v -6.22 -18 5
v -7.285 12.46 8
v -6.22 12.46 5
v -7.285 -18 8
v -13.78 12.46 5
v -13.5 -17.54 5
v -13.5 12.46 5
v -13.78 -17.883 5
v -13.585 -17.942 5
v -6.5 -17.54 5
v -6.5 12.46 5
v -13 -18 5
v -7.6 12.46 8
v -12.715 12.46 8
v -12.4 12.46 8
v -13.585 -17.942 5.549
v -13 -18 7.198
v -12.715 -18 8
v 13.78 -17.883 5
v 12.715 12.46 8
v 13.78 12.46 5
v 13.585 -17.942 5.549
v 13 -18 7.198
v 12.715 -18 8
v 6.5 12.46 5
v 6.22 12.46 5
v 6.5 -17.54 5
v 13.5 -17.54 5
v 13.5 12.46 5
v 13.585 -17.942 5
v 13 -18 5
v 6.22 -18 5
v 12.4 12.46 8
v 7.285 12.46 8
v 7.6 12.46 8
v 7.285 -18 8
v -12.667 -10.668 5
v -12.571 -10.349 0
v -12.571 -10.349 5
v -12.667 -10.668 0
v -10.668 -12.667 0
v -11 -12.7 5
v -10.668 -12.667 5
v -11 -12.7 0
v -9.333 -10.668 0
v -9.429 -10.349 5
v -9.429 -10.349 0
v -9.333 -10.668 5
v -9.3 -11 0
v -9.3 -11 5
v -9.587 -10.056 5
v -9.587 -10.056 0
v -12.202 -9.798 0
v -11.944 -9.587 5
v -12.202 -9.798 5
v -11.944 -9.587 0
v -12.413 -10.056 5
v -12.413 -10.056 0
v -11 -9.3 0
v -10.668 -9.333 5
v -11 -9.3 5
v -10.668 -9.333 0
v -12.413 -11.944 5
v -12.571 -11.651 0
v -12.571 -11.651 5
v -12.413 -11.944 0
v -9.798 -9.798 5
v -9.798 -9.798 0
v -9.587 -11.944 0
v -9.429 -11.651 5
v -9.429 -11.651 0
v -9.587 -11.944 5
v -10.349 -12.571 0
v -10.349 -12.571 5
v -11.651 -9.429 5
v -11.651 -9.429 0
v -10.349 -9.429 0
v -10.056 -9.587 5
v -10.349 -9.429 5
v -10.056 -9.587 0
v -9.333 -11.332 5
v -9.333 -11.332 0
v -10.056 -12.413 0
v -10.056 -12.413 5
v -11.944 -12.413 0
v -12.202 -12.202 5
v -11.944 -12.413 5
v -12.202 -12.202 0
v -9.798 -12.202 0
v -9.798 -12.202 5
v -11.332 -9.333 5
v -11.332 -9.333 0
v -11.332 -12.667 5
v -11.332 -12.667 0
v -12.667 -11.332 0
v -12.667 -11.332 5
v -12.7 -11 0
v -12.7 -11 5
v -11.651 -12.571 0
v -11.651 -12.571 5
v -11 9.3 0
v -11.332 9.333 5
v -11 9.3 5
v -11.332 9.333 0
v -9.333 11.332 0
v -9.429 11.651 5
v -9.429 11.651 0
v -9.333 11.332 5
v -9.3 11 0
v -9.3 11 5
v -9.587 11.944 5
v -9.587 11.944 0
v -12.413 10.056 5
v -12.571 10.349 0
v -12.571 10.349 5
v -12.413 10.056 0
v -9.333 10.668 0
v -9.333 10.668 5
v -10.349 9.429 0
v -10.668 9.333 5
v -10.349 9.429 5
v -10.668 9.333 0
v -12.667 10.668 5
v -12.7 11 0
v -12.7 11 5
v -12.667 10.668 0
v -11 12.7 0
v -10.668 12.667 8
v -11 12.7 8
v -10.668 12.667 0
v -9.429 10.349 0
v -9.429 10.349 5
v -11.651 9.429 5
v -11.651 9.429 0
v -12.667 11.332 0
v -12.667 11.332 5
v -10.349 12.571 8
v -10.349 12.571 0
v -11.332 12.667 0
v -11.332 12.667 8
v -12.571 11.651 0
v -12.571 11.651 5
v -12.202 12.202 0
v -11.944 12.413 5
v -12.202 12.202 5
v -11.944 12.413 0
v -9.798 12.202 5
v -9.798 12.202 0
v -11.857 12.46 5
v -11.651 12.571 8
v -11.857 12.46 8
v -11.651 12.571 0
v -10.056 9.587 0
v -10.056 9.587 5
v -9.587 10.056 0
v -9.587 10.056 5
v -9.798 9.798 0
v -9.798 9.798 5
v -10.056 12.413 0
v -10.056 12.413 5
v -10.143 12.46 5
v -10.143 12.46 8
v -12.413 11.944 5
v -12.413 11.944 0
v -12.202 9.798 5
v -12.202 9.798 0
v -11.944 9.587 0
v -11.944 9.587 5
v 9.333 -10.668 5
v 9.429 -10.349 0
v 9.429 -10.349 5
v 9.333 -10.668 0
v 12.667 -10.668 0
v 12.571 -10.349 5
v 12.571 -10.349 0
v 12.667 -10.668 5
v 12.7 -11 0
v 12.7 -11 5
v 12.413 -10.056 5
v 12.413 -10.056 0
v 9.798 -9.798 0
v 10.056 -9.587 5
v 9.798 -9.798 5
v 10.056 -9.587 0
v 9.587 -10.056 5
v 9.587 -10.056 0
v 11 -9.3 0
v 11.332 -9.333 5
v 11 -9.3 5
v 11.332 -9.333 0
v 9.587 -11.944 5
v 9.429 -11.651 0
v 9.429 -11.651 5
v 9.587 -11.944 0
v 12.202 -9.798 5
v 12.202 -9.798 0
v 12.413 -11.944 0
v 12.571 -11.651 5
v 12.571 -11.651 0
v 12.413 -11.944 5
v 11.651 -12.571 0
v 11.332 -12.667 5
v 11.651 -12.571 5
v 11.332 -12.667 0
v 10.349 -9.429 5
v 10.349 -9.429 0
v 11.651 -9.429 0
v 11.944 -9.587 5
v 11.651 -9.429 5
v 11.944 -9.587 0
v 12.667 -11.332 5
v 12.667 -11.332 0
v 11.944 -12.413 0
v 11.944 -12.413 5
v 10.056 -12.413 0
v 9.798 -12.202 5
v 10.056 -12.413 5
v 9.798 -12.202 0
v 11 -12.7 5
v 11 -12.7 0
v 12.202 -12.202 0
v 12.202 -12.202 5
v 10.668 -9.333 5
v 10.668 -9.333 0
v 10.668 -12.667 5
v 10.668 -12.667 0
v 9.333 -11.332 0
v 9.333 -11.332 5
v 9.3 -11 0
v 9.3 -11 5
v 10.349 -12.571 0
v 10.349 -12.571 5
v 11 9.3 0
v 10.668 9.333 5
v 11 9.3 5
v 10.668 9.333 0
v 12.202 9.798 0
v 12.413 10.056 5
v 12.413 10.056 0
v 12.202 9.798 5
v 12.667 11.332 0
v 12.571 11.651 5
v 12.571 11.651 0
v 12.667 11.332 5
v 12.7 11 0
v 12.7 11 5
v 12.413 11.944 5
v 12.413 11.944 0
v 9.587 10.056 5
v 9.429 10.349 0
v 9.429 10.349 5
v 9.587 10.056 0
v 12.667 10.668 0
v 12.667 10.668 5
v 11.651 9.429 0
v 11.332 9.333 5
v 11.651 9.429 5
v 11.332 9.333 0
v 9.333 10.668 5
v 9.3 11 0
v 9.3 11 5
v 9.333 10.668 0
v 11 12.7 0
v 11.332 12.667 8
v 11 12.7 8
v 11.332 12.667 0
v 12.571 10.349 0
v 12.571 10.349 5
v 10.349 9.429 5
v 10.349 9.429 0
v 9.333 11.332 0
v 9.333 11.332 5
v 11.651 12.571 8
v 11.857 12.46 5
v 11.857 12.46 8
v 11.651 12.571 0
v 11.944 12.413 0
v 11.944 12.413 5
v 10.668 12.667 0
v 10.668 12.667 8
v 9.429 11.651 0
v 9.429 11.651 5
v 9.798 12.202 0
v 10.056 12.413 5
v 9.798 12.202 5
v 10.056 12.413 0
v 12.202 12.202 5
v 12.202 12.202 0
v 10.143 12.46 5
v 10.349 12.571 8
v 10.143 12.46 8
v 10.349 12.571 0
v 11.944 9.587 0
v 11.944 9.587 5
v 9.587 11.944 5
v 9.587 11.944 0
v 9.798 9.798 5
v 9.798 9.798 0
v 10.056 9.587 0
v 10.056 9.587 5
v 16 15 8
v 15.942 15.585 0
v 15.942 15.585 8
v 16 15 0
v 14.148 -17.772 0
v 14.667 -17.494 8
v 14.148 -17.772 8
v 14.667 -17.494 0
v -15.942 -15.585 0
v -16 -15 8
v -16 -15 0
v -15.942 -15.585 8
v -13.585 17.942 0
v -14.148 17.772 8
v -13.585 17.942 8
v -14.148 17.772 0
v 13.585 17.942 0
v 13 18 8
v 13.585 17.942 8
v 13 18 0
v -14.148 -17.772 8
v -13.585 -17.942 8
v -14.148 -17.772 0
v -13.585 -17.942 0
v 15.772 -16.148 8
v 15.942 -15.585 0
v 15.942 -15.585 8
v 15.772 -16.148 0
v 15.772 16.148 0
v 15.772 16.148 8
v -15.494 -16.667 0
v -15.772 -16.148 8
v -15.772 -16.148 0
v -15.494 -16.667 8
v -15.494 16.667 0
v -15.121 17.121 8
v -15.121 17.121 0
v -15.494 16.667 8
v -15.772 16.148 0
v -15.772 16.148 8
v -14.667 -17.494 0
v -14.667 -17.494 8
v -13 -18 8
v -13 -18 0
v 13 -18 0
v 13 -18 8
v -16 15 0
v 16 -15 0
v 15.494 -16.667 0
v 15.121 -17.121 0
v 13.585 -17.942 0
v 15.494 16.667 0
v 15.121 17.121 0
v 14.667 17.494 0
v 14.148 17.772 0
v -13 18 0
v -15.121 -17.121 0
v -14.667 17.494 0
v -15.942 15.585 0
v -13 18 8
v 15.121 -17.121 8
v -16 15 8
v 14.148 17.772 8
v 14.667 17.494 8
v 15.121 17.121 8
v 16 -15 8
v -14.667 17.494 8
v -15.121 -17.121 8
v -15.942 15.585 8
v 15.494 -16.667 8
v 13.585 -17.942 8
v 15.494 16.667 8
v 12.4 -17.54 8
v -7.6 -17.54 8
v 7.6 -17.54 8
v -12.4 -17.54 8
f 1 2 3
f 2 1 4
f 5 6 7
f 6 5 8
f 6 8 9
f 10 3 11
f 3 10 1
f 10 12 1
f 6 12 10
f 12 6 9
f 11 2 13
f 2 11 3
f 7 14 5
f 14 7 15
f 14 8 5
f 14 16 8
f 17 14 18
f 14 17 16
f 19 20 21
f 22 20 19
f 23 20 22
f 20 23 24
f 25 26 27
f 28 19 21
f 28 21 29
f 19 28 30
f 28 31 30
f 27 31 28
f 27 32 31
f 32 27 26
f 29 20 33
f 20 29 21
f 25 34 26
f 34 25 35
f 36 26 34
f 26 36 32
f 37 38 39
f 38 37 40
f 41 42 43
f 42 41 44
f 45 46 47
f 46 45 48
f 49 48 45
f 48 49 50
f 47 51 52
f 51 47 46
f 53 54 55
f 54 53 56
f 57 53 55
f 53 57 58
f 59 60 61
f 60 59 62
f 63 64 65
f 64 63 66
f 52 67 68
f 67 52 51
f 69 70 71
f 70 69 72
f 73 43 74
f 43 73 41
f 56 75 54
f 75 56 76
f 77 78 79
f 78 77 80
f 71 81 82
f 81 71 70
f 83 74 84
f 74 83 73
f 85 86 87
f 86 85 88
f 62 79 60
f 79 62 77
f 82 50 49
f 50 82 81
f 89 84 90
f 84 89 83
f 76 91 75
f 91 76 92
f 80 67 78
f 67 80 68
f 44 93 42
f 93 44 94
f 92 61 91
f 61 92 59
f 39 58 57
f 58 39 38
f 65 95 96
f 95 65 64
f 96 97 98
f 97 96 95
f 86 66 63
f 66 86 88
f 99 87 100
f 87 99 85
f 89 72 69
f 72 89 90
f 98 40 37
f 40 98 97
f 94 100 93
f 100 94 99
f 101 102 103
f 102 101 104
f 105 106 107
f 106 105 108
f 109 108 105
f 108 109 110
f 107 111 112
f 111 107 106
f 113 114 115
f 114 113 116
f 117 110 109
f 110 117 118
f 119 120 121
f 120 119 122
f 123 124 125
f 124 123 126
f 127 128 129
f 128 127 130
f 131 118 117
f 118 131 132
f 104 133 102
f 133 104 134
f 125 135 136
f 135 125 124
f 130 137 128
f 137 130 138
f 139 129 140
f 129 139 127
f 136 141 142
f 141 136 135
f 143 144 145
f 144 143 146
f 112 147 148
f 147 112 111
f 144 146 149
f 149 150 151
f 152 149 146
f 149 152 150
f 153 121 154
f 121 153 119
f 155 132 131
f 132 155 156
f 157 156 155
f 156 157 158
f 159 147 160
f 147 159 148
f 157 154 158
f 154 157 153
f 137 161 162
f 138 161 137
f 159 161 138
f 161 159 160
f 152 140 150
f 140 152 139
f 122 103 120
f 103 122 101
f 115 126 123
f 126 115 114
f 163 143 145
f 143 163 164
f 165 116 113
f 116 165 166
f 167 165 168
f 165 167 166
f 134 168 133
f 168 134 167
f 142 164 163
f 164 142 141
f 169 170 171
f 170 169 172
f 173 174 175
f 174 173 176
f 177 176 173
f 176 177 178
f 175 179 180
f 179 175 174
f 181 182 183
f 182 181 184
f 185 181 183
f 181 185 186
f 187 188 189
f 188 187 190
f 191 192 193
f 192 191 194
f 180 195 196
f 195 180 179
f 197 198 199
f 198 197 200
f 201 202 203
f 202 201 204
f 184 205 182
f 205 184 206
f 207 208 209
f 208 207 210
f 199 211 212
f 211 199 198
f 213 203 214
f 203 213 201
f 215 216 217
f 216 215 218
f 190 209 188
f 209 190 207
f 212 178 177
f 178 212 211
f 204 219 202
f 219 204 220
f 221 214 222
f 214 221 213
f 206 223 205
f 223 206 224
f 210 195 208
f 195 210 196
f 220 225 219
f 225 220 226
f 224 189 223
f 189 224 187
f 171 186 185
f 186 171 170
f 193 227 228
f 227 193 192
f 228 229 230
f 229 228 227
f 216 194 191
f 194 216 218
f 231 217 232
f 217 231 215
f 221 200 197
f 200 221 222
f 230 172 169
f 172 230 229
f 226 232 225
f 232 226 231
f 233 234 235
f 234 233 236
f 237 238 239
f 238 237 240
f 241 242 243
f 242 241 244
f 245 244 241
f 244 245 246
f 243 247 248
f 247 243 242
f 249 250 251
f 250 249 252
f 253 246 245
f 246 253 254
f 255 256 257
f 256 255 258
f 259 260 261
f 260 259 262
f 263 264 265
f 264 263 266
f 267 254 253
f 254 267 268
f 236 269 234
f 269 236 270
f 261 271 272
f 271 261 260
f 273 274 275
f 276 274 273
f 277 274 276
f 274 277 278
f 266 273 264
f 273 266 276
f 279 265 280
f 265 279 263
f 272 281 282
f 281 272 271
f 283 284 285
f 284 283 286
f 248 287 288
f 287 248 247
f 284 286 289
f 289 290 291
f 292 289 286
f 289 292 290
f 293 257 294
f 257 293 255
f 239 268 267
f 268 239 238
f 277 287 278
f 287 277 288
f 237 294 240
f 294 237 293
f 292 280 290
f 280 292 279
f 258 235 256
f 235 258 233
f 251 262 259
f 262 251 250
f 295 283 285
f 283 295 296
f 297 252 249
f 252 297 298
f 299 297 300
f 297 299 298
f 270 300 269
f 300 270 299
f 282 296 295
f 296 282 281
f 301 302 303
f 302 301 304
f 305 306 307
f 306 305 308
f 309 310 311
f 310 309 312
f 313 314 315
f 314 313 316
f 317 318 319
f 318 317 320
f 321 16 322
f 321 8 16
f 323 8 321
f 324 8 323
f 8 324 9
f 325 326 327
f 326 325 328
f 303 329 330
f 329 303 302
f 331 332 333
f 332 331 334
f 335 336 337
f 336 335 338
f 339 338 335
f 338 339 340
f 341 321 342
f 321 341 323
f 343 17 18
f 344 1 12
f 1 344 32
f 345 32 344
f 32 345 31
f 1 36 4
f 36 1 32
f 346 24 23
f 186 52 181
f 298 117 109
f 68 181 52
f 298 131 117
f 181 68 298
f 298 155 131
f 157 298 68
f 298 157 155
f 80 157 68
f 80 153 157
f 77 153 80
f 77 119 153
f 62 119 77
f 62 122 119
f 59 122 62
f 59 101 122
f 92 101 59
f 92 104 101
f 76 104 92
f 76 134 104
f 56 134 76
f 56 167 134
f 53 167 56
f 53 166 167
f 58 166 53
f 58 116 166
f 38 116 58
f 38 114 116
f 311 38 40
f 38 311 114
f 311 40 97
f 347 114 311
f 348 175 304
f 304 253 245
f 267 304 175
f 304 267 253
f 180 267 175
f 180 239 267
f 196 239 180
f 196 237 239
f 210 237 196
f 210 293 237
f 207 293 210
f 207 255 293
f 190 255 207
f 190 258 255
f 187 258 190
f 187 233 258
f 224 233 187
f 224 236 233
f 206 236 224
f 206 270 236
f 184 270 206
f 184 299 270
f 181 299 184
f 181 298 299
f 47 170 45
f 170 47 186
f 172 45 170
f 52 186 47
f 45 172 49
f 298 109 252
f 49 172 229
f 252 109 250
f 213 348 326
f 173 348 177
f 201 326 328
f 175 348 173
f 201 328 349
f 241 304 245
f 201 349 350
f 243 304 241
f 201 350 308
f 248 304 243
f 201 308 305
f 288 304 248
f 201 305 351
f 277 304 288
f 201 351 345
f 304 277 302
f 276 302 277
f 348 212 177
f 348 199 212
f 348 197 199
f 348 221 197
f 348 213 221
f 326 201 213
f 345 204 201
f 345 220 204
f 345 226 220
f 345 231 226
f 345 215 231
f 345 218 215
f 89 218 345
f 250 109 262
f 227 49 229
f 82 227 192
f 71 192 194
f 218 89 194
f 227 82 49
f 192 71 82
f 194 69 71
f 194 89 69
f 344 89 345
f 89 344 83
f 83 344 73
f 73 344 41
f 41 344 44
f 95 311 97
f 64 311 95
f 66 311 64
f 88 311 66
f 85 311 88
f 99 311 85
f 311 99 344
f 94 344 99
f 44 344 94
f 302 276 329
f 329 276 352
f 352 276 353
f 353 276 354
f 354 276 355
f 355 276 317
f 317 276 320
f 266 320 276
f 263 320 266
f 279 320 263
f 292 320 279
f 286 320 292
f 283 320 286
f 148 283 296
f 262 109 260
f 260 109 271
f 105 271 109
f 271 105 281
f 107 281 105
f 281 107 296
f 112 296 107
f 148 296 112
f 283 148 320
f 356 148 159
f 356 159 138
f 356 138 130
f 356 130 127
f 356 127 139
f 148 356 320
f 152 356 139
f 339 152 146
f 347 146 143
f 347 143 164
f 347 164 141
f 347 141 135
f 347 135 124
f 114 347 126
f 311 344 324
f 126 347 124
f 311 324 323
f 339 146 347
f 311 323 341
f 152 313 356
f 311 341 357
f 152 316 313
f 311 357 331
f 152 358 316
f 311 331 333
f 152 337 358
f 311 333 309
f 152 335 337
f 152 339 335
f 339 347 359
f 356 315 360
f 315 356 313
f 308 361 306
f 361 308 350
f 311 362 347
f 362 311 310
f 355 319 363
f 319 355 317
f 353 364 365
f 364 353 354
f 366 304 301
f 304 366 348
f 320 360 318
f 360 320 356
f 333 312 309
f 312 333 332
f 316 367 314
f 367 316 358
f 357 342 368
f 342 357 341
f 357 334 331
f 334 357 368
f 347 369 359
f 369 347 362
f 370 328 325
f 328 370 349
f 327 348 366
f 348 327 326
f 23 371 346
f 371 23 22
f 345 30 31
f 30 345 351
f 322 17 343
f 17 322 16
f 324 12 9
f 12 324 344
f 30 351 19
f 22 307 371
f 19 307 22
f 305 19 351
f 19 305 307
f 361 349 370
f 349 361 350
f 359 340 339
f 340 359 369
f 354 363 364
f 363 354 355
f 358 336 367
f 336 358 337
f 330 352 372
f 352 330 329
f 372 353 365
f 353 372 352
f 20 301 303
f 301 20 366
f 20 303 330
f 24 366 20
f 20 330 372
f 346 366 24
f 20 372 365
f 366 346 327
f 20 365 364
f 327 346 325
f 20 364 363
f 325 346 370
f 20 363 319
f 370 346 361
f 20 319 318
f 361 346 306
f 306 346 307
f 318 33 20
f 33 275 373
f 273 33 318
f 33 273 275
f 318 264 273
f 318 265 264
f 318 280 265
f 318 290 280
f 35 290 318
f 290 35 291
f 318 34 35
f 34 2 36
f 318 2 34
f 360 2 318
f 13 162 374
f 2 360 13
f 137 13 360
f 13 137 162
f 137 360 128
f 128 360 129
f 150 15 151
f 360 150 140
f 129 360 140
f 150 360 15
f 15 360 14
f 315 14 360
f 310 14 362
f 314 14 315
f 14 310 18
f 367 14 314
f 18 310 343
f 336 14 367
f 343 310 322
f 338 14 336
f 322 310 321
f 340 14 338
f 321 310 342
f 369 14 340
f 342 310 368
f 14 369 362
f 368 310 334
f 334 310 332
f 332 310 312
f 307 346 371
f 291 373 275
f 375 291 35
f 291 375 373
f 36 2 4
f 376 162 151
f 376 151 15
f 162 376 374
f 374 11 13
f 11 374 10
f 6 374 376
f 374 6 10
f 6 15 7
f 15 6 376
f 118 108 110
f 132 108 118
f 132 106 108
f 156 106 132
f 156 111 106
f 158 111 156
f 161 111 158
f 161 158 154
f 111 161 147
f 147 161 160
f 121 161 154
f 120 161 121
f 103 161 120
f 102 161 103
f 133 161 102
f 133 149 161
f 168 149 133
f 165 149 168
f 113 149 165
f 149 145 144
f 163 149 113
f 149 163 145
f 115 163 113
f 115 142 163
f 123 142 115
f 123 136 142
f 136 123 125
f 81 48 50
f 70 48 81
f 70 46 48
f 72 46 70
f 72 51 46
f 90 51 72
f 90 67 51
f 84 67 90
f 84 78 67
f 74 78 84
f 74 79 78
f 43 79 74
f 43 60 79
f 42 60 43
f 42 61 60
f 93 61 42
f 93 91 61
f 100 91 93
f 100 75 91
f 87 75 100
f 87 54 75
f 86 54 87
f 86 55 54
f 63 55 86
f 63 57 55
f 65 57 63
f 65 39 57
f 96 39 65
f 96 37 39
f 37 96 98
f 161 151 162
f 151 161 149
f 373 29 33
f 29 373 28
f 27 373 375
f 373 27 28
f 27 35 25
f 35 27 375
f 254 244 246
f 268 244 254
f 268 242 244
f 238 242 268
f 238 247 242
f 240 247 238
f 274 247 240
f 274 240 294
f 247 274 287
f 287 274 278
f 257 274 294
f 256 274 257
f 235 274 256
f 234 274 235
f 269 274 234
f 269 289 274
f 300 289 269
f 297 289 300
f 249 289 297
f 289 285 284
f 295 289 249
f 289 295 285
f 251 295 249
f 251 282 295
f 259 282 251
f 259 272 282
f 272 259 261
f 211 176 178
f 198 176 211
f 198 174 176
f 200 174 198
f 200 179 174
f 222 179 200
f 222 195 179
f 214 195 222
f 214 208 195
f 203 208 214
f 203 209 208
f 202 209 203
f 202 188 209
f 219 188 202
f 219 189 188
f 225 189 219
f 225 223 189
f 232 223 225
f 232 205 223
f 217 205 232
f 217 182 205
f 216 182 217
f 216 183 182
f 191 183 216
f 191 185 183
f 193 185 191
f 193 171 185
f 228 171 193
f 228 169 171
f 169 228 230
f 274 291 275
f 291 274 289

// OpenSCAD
// file: ../source/rm_common.scad
// RobotMind Rev A: one slide-in interface for every payload carrier.
// Dimensions are mm; tune clearance on a short fit coupon before full prints.
$fn = 32;

RM_EPS = 0.1;
RM_CLEARANCE = 0.28;
RM_M3_CLEARANCE = 3.4;

RM_DOCK_W = 32;
RM_DOCK_L = 36;
RM_DOCK_H = 8;
RM_RAIL_X = 10;
RM_RAIL_ROOT = 4.8;
RM_RAIL_HEAD = 7.0;
RM_RAIL_H = 3.0;
RM_RAIL_L = 30;

assert(RM_RAIL_HEAD > RM_RAIL_ROOT, "Rail must retain the carrier");
assert(RM_DOCK_H > RM_RAIL_H, "Dock needs material below the rail");
assert(RM_RAIL_L + 2*RM_CLEARANCE < RM_DOCK_L,
       "Rail needs an open insertion end and rear stop");

module rounded_box(size=[20,20,3], r=2) {
  linear_extrude(height=size[2])
    offset(r=r) offset(delta=-r) square([size[0],size[1]]);
}

// The profile is narrow at the carrier root and wider at its free end.
module rail_profile(root=RM_RAIL_ROOT, head=RM_RAIL_HEAD, h=RM_RAIL_H) {
  polygon(points=[[-root/2,0], [root/2,0], [head/2,h], [-head/2,h]]);
}

// Runs along +Y and projects below Z=0. Carriers place this at their underside.
module male_rail(length=RM_RAIL_L) {
  translate([0,-length/2,0]) rotate([-90,0,0])
    linear_extrude(height=length) rail_profile();
}

module male_interface() {
  for(x=[-RM_RAIL_X,RM_RAIL_X])
    translate([x,0,0]) male_rail();
}

// Matching void, open at the front (-Y); material at +Y is the hard stop.
module rail_channel(length=RM_RAIL_L+2*RM_CLEARANCE) {
  translate([0,-RM_DOCK_L/2-RM_EPS,RM_DOCK_H+RM_EPS]) rotate([-90,0,0])
    linear_extrude(height=length)
      rail_profile(RM_RAIL_ROOT+2*RM_CLEARANCE,
                   RM_RAIL_HEAD+2*RM_CLEARANCE,
                   RM_RAIL_H+RM_EPS);
}

module universal_dock() {
  difference() {
    translate([-RM_DOCK_W/2,-RM_DOCK_L/2,0])
      rounded_box([RM_DOCK_W,RM_DOCK_L,RM_DOCK_H],3);
    for(x=[-RM_RAIL_X,RM_RAIL_X]) translate([x,0,0]) rail_channel();
    for(x=[-11,11], y=[-11,11])
      translate([x,y,-RM_EPS]) cylinder(h=RM_DOCK_H+2*RM_EPS,d=RM_M3_CLEARANCE);
  }
}

// Place a carrier's Z=0 plane at the dock surface; its rails fill the recess.
function docked_carrier_z() = RM_DOCK_H;
// Centre position after the rail reaches the rear stop.
function docked_carrier_y() = -RM_DOCK_L/2 - RM_EPS +
                              RM_RAIL_L/2 + 2*RM_CLEARANCE;
// main file
include <../source/rm_common.scad>

// Real-profile mating check: front entry, captured head, and a rear stop.
universal_dock();
translate([0,docked_carrier_y(),docked_carrier_z()]) male_interface();
